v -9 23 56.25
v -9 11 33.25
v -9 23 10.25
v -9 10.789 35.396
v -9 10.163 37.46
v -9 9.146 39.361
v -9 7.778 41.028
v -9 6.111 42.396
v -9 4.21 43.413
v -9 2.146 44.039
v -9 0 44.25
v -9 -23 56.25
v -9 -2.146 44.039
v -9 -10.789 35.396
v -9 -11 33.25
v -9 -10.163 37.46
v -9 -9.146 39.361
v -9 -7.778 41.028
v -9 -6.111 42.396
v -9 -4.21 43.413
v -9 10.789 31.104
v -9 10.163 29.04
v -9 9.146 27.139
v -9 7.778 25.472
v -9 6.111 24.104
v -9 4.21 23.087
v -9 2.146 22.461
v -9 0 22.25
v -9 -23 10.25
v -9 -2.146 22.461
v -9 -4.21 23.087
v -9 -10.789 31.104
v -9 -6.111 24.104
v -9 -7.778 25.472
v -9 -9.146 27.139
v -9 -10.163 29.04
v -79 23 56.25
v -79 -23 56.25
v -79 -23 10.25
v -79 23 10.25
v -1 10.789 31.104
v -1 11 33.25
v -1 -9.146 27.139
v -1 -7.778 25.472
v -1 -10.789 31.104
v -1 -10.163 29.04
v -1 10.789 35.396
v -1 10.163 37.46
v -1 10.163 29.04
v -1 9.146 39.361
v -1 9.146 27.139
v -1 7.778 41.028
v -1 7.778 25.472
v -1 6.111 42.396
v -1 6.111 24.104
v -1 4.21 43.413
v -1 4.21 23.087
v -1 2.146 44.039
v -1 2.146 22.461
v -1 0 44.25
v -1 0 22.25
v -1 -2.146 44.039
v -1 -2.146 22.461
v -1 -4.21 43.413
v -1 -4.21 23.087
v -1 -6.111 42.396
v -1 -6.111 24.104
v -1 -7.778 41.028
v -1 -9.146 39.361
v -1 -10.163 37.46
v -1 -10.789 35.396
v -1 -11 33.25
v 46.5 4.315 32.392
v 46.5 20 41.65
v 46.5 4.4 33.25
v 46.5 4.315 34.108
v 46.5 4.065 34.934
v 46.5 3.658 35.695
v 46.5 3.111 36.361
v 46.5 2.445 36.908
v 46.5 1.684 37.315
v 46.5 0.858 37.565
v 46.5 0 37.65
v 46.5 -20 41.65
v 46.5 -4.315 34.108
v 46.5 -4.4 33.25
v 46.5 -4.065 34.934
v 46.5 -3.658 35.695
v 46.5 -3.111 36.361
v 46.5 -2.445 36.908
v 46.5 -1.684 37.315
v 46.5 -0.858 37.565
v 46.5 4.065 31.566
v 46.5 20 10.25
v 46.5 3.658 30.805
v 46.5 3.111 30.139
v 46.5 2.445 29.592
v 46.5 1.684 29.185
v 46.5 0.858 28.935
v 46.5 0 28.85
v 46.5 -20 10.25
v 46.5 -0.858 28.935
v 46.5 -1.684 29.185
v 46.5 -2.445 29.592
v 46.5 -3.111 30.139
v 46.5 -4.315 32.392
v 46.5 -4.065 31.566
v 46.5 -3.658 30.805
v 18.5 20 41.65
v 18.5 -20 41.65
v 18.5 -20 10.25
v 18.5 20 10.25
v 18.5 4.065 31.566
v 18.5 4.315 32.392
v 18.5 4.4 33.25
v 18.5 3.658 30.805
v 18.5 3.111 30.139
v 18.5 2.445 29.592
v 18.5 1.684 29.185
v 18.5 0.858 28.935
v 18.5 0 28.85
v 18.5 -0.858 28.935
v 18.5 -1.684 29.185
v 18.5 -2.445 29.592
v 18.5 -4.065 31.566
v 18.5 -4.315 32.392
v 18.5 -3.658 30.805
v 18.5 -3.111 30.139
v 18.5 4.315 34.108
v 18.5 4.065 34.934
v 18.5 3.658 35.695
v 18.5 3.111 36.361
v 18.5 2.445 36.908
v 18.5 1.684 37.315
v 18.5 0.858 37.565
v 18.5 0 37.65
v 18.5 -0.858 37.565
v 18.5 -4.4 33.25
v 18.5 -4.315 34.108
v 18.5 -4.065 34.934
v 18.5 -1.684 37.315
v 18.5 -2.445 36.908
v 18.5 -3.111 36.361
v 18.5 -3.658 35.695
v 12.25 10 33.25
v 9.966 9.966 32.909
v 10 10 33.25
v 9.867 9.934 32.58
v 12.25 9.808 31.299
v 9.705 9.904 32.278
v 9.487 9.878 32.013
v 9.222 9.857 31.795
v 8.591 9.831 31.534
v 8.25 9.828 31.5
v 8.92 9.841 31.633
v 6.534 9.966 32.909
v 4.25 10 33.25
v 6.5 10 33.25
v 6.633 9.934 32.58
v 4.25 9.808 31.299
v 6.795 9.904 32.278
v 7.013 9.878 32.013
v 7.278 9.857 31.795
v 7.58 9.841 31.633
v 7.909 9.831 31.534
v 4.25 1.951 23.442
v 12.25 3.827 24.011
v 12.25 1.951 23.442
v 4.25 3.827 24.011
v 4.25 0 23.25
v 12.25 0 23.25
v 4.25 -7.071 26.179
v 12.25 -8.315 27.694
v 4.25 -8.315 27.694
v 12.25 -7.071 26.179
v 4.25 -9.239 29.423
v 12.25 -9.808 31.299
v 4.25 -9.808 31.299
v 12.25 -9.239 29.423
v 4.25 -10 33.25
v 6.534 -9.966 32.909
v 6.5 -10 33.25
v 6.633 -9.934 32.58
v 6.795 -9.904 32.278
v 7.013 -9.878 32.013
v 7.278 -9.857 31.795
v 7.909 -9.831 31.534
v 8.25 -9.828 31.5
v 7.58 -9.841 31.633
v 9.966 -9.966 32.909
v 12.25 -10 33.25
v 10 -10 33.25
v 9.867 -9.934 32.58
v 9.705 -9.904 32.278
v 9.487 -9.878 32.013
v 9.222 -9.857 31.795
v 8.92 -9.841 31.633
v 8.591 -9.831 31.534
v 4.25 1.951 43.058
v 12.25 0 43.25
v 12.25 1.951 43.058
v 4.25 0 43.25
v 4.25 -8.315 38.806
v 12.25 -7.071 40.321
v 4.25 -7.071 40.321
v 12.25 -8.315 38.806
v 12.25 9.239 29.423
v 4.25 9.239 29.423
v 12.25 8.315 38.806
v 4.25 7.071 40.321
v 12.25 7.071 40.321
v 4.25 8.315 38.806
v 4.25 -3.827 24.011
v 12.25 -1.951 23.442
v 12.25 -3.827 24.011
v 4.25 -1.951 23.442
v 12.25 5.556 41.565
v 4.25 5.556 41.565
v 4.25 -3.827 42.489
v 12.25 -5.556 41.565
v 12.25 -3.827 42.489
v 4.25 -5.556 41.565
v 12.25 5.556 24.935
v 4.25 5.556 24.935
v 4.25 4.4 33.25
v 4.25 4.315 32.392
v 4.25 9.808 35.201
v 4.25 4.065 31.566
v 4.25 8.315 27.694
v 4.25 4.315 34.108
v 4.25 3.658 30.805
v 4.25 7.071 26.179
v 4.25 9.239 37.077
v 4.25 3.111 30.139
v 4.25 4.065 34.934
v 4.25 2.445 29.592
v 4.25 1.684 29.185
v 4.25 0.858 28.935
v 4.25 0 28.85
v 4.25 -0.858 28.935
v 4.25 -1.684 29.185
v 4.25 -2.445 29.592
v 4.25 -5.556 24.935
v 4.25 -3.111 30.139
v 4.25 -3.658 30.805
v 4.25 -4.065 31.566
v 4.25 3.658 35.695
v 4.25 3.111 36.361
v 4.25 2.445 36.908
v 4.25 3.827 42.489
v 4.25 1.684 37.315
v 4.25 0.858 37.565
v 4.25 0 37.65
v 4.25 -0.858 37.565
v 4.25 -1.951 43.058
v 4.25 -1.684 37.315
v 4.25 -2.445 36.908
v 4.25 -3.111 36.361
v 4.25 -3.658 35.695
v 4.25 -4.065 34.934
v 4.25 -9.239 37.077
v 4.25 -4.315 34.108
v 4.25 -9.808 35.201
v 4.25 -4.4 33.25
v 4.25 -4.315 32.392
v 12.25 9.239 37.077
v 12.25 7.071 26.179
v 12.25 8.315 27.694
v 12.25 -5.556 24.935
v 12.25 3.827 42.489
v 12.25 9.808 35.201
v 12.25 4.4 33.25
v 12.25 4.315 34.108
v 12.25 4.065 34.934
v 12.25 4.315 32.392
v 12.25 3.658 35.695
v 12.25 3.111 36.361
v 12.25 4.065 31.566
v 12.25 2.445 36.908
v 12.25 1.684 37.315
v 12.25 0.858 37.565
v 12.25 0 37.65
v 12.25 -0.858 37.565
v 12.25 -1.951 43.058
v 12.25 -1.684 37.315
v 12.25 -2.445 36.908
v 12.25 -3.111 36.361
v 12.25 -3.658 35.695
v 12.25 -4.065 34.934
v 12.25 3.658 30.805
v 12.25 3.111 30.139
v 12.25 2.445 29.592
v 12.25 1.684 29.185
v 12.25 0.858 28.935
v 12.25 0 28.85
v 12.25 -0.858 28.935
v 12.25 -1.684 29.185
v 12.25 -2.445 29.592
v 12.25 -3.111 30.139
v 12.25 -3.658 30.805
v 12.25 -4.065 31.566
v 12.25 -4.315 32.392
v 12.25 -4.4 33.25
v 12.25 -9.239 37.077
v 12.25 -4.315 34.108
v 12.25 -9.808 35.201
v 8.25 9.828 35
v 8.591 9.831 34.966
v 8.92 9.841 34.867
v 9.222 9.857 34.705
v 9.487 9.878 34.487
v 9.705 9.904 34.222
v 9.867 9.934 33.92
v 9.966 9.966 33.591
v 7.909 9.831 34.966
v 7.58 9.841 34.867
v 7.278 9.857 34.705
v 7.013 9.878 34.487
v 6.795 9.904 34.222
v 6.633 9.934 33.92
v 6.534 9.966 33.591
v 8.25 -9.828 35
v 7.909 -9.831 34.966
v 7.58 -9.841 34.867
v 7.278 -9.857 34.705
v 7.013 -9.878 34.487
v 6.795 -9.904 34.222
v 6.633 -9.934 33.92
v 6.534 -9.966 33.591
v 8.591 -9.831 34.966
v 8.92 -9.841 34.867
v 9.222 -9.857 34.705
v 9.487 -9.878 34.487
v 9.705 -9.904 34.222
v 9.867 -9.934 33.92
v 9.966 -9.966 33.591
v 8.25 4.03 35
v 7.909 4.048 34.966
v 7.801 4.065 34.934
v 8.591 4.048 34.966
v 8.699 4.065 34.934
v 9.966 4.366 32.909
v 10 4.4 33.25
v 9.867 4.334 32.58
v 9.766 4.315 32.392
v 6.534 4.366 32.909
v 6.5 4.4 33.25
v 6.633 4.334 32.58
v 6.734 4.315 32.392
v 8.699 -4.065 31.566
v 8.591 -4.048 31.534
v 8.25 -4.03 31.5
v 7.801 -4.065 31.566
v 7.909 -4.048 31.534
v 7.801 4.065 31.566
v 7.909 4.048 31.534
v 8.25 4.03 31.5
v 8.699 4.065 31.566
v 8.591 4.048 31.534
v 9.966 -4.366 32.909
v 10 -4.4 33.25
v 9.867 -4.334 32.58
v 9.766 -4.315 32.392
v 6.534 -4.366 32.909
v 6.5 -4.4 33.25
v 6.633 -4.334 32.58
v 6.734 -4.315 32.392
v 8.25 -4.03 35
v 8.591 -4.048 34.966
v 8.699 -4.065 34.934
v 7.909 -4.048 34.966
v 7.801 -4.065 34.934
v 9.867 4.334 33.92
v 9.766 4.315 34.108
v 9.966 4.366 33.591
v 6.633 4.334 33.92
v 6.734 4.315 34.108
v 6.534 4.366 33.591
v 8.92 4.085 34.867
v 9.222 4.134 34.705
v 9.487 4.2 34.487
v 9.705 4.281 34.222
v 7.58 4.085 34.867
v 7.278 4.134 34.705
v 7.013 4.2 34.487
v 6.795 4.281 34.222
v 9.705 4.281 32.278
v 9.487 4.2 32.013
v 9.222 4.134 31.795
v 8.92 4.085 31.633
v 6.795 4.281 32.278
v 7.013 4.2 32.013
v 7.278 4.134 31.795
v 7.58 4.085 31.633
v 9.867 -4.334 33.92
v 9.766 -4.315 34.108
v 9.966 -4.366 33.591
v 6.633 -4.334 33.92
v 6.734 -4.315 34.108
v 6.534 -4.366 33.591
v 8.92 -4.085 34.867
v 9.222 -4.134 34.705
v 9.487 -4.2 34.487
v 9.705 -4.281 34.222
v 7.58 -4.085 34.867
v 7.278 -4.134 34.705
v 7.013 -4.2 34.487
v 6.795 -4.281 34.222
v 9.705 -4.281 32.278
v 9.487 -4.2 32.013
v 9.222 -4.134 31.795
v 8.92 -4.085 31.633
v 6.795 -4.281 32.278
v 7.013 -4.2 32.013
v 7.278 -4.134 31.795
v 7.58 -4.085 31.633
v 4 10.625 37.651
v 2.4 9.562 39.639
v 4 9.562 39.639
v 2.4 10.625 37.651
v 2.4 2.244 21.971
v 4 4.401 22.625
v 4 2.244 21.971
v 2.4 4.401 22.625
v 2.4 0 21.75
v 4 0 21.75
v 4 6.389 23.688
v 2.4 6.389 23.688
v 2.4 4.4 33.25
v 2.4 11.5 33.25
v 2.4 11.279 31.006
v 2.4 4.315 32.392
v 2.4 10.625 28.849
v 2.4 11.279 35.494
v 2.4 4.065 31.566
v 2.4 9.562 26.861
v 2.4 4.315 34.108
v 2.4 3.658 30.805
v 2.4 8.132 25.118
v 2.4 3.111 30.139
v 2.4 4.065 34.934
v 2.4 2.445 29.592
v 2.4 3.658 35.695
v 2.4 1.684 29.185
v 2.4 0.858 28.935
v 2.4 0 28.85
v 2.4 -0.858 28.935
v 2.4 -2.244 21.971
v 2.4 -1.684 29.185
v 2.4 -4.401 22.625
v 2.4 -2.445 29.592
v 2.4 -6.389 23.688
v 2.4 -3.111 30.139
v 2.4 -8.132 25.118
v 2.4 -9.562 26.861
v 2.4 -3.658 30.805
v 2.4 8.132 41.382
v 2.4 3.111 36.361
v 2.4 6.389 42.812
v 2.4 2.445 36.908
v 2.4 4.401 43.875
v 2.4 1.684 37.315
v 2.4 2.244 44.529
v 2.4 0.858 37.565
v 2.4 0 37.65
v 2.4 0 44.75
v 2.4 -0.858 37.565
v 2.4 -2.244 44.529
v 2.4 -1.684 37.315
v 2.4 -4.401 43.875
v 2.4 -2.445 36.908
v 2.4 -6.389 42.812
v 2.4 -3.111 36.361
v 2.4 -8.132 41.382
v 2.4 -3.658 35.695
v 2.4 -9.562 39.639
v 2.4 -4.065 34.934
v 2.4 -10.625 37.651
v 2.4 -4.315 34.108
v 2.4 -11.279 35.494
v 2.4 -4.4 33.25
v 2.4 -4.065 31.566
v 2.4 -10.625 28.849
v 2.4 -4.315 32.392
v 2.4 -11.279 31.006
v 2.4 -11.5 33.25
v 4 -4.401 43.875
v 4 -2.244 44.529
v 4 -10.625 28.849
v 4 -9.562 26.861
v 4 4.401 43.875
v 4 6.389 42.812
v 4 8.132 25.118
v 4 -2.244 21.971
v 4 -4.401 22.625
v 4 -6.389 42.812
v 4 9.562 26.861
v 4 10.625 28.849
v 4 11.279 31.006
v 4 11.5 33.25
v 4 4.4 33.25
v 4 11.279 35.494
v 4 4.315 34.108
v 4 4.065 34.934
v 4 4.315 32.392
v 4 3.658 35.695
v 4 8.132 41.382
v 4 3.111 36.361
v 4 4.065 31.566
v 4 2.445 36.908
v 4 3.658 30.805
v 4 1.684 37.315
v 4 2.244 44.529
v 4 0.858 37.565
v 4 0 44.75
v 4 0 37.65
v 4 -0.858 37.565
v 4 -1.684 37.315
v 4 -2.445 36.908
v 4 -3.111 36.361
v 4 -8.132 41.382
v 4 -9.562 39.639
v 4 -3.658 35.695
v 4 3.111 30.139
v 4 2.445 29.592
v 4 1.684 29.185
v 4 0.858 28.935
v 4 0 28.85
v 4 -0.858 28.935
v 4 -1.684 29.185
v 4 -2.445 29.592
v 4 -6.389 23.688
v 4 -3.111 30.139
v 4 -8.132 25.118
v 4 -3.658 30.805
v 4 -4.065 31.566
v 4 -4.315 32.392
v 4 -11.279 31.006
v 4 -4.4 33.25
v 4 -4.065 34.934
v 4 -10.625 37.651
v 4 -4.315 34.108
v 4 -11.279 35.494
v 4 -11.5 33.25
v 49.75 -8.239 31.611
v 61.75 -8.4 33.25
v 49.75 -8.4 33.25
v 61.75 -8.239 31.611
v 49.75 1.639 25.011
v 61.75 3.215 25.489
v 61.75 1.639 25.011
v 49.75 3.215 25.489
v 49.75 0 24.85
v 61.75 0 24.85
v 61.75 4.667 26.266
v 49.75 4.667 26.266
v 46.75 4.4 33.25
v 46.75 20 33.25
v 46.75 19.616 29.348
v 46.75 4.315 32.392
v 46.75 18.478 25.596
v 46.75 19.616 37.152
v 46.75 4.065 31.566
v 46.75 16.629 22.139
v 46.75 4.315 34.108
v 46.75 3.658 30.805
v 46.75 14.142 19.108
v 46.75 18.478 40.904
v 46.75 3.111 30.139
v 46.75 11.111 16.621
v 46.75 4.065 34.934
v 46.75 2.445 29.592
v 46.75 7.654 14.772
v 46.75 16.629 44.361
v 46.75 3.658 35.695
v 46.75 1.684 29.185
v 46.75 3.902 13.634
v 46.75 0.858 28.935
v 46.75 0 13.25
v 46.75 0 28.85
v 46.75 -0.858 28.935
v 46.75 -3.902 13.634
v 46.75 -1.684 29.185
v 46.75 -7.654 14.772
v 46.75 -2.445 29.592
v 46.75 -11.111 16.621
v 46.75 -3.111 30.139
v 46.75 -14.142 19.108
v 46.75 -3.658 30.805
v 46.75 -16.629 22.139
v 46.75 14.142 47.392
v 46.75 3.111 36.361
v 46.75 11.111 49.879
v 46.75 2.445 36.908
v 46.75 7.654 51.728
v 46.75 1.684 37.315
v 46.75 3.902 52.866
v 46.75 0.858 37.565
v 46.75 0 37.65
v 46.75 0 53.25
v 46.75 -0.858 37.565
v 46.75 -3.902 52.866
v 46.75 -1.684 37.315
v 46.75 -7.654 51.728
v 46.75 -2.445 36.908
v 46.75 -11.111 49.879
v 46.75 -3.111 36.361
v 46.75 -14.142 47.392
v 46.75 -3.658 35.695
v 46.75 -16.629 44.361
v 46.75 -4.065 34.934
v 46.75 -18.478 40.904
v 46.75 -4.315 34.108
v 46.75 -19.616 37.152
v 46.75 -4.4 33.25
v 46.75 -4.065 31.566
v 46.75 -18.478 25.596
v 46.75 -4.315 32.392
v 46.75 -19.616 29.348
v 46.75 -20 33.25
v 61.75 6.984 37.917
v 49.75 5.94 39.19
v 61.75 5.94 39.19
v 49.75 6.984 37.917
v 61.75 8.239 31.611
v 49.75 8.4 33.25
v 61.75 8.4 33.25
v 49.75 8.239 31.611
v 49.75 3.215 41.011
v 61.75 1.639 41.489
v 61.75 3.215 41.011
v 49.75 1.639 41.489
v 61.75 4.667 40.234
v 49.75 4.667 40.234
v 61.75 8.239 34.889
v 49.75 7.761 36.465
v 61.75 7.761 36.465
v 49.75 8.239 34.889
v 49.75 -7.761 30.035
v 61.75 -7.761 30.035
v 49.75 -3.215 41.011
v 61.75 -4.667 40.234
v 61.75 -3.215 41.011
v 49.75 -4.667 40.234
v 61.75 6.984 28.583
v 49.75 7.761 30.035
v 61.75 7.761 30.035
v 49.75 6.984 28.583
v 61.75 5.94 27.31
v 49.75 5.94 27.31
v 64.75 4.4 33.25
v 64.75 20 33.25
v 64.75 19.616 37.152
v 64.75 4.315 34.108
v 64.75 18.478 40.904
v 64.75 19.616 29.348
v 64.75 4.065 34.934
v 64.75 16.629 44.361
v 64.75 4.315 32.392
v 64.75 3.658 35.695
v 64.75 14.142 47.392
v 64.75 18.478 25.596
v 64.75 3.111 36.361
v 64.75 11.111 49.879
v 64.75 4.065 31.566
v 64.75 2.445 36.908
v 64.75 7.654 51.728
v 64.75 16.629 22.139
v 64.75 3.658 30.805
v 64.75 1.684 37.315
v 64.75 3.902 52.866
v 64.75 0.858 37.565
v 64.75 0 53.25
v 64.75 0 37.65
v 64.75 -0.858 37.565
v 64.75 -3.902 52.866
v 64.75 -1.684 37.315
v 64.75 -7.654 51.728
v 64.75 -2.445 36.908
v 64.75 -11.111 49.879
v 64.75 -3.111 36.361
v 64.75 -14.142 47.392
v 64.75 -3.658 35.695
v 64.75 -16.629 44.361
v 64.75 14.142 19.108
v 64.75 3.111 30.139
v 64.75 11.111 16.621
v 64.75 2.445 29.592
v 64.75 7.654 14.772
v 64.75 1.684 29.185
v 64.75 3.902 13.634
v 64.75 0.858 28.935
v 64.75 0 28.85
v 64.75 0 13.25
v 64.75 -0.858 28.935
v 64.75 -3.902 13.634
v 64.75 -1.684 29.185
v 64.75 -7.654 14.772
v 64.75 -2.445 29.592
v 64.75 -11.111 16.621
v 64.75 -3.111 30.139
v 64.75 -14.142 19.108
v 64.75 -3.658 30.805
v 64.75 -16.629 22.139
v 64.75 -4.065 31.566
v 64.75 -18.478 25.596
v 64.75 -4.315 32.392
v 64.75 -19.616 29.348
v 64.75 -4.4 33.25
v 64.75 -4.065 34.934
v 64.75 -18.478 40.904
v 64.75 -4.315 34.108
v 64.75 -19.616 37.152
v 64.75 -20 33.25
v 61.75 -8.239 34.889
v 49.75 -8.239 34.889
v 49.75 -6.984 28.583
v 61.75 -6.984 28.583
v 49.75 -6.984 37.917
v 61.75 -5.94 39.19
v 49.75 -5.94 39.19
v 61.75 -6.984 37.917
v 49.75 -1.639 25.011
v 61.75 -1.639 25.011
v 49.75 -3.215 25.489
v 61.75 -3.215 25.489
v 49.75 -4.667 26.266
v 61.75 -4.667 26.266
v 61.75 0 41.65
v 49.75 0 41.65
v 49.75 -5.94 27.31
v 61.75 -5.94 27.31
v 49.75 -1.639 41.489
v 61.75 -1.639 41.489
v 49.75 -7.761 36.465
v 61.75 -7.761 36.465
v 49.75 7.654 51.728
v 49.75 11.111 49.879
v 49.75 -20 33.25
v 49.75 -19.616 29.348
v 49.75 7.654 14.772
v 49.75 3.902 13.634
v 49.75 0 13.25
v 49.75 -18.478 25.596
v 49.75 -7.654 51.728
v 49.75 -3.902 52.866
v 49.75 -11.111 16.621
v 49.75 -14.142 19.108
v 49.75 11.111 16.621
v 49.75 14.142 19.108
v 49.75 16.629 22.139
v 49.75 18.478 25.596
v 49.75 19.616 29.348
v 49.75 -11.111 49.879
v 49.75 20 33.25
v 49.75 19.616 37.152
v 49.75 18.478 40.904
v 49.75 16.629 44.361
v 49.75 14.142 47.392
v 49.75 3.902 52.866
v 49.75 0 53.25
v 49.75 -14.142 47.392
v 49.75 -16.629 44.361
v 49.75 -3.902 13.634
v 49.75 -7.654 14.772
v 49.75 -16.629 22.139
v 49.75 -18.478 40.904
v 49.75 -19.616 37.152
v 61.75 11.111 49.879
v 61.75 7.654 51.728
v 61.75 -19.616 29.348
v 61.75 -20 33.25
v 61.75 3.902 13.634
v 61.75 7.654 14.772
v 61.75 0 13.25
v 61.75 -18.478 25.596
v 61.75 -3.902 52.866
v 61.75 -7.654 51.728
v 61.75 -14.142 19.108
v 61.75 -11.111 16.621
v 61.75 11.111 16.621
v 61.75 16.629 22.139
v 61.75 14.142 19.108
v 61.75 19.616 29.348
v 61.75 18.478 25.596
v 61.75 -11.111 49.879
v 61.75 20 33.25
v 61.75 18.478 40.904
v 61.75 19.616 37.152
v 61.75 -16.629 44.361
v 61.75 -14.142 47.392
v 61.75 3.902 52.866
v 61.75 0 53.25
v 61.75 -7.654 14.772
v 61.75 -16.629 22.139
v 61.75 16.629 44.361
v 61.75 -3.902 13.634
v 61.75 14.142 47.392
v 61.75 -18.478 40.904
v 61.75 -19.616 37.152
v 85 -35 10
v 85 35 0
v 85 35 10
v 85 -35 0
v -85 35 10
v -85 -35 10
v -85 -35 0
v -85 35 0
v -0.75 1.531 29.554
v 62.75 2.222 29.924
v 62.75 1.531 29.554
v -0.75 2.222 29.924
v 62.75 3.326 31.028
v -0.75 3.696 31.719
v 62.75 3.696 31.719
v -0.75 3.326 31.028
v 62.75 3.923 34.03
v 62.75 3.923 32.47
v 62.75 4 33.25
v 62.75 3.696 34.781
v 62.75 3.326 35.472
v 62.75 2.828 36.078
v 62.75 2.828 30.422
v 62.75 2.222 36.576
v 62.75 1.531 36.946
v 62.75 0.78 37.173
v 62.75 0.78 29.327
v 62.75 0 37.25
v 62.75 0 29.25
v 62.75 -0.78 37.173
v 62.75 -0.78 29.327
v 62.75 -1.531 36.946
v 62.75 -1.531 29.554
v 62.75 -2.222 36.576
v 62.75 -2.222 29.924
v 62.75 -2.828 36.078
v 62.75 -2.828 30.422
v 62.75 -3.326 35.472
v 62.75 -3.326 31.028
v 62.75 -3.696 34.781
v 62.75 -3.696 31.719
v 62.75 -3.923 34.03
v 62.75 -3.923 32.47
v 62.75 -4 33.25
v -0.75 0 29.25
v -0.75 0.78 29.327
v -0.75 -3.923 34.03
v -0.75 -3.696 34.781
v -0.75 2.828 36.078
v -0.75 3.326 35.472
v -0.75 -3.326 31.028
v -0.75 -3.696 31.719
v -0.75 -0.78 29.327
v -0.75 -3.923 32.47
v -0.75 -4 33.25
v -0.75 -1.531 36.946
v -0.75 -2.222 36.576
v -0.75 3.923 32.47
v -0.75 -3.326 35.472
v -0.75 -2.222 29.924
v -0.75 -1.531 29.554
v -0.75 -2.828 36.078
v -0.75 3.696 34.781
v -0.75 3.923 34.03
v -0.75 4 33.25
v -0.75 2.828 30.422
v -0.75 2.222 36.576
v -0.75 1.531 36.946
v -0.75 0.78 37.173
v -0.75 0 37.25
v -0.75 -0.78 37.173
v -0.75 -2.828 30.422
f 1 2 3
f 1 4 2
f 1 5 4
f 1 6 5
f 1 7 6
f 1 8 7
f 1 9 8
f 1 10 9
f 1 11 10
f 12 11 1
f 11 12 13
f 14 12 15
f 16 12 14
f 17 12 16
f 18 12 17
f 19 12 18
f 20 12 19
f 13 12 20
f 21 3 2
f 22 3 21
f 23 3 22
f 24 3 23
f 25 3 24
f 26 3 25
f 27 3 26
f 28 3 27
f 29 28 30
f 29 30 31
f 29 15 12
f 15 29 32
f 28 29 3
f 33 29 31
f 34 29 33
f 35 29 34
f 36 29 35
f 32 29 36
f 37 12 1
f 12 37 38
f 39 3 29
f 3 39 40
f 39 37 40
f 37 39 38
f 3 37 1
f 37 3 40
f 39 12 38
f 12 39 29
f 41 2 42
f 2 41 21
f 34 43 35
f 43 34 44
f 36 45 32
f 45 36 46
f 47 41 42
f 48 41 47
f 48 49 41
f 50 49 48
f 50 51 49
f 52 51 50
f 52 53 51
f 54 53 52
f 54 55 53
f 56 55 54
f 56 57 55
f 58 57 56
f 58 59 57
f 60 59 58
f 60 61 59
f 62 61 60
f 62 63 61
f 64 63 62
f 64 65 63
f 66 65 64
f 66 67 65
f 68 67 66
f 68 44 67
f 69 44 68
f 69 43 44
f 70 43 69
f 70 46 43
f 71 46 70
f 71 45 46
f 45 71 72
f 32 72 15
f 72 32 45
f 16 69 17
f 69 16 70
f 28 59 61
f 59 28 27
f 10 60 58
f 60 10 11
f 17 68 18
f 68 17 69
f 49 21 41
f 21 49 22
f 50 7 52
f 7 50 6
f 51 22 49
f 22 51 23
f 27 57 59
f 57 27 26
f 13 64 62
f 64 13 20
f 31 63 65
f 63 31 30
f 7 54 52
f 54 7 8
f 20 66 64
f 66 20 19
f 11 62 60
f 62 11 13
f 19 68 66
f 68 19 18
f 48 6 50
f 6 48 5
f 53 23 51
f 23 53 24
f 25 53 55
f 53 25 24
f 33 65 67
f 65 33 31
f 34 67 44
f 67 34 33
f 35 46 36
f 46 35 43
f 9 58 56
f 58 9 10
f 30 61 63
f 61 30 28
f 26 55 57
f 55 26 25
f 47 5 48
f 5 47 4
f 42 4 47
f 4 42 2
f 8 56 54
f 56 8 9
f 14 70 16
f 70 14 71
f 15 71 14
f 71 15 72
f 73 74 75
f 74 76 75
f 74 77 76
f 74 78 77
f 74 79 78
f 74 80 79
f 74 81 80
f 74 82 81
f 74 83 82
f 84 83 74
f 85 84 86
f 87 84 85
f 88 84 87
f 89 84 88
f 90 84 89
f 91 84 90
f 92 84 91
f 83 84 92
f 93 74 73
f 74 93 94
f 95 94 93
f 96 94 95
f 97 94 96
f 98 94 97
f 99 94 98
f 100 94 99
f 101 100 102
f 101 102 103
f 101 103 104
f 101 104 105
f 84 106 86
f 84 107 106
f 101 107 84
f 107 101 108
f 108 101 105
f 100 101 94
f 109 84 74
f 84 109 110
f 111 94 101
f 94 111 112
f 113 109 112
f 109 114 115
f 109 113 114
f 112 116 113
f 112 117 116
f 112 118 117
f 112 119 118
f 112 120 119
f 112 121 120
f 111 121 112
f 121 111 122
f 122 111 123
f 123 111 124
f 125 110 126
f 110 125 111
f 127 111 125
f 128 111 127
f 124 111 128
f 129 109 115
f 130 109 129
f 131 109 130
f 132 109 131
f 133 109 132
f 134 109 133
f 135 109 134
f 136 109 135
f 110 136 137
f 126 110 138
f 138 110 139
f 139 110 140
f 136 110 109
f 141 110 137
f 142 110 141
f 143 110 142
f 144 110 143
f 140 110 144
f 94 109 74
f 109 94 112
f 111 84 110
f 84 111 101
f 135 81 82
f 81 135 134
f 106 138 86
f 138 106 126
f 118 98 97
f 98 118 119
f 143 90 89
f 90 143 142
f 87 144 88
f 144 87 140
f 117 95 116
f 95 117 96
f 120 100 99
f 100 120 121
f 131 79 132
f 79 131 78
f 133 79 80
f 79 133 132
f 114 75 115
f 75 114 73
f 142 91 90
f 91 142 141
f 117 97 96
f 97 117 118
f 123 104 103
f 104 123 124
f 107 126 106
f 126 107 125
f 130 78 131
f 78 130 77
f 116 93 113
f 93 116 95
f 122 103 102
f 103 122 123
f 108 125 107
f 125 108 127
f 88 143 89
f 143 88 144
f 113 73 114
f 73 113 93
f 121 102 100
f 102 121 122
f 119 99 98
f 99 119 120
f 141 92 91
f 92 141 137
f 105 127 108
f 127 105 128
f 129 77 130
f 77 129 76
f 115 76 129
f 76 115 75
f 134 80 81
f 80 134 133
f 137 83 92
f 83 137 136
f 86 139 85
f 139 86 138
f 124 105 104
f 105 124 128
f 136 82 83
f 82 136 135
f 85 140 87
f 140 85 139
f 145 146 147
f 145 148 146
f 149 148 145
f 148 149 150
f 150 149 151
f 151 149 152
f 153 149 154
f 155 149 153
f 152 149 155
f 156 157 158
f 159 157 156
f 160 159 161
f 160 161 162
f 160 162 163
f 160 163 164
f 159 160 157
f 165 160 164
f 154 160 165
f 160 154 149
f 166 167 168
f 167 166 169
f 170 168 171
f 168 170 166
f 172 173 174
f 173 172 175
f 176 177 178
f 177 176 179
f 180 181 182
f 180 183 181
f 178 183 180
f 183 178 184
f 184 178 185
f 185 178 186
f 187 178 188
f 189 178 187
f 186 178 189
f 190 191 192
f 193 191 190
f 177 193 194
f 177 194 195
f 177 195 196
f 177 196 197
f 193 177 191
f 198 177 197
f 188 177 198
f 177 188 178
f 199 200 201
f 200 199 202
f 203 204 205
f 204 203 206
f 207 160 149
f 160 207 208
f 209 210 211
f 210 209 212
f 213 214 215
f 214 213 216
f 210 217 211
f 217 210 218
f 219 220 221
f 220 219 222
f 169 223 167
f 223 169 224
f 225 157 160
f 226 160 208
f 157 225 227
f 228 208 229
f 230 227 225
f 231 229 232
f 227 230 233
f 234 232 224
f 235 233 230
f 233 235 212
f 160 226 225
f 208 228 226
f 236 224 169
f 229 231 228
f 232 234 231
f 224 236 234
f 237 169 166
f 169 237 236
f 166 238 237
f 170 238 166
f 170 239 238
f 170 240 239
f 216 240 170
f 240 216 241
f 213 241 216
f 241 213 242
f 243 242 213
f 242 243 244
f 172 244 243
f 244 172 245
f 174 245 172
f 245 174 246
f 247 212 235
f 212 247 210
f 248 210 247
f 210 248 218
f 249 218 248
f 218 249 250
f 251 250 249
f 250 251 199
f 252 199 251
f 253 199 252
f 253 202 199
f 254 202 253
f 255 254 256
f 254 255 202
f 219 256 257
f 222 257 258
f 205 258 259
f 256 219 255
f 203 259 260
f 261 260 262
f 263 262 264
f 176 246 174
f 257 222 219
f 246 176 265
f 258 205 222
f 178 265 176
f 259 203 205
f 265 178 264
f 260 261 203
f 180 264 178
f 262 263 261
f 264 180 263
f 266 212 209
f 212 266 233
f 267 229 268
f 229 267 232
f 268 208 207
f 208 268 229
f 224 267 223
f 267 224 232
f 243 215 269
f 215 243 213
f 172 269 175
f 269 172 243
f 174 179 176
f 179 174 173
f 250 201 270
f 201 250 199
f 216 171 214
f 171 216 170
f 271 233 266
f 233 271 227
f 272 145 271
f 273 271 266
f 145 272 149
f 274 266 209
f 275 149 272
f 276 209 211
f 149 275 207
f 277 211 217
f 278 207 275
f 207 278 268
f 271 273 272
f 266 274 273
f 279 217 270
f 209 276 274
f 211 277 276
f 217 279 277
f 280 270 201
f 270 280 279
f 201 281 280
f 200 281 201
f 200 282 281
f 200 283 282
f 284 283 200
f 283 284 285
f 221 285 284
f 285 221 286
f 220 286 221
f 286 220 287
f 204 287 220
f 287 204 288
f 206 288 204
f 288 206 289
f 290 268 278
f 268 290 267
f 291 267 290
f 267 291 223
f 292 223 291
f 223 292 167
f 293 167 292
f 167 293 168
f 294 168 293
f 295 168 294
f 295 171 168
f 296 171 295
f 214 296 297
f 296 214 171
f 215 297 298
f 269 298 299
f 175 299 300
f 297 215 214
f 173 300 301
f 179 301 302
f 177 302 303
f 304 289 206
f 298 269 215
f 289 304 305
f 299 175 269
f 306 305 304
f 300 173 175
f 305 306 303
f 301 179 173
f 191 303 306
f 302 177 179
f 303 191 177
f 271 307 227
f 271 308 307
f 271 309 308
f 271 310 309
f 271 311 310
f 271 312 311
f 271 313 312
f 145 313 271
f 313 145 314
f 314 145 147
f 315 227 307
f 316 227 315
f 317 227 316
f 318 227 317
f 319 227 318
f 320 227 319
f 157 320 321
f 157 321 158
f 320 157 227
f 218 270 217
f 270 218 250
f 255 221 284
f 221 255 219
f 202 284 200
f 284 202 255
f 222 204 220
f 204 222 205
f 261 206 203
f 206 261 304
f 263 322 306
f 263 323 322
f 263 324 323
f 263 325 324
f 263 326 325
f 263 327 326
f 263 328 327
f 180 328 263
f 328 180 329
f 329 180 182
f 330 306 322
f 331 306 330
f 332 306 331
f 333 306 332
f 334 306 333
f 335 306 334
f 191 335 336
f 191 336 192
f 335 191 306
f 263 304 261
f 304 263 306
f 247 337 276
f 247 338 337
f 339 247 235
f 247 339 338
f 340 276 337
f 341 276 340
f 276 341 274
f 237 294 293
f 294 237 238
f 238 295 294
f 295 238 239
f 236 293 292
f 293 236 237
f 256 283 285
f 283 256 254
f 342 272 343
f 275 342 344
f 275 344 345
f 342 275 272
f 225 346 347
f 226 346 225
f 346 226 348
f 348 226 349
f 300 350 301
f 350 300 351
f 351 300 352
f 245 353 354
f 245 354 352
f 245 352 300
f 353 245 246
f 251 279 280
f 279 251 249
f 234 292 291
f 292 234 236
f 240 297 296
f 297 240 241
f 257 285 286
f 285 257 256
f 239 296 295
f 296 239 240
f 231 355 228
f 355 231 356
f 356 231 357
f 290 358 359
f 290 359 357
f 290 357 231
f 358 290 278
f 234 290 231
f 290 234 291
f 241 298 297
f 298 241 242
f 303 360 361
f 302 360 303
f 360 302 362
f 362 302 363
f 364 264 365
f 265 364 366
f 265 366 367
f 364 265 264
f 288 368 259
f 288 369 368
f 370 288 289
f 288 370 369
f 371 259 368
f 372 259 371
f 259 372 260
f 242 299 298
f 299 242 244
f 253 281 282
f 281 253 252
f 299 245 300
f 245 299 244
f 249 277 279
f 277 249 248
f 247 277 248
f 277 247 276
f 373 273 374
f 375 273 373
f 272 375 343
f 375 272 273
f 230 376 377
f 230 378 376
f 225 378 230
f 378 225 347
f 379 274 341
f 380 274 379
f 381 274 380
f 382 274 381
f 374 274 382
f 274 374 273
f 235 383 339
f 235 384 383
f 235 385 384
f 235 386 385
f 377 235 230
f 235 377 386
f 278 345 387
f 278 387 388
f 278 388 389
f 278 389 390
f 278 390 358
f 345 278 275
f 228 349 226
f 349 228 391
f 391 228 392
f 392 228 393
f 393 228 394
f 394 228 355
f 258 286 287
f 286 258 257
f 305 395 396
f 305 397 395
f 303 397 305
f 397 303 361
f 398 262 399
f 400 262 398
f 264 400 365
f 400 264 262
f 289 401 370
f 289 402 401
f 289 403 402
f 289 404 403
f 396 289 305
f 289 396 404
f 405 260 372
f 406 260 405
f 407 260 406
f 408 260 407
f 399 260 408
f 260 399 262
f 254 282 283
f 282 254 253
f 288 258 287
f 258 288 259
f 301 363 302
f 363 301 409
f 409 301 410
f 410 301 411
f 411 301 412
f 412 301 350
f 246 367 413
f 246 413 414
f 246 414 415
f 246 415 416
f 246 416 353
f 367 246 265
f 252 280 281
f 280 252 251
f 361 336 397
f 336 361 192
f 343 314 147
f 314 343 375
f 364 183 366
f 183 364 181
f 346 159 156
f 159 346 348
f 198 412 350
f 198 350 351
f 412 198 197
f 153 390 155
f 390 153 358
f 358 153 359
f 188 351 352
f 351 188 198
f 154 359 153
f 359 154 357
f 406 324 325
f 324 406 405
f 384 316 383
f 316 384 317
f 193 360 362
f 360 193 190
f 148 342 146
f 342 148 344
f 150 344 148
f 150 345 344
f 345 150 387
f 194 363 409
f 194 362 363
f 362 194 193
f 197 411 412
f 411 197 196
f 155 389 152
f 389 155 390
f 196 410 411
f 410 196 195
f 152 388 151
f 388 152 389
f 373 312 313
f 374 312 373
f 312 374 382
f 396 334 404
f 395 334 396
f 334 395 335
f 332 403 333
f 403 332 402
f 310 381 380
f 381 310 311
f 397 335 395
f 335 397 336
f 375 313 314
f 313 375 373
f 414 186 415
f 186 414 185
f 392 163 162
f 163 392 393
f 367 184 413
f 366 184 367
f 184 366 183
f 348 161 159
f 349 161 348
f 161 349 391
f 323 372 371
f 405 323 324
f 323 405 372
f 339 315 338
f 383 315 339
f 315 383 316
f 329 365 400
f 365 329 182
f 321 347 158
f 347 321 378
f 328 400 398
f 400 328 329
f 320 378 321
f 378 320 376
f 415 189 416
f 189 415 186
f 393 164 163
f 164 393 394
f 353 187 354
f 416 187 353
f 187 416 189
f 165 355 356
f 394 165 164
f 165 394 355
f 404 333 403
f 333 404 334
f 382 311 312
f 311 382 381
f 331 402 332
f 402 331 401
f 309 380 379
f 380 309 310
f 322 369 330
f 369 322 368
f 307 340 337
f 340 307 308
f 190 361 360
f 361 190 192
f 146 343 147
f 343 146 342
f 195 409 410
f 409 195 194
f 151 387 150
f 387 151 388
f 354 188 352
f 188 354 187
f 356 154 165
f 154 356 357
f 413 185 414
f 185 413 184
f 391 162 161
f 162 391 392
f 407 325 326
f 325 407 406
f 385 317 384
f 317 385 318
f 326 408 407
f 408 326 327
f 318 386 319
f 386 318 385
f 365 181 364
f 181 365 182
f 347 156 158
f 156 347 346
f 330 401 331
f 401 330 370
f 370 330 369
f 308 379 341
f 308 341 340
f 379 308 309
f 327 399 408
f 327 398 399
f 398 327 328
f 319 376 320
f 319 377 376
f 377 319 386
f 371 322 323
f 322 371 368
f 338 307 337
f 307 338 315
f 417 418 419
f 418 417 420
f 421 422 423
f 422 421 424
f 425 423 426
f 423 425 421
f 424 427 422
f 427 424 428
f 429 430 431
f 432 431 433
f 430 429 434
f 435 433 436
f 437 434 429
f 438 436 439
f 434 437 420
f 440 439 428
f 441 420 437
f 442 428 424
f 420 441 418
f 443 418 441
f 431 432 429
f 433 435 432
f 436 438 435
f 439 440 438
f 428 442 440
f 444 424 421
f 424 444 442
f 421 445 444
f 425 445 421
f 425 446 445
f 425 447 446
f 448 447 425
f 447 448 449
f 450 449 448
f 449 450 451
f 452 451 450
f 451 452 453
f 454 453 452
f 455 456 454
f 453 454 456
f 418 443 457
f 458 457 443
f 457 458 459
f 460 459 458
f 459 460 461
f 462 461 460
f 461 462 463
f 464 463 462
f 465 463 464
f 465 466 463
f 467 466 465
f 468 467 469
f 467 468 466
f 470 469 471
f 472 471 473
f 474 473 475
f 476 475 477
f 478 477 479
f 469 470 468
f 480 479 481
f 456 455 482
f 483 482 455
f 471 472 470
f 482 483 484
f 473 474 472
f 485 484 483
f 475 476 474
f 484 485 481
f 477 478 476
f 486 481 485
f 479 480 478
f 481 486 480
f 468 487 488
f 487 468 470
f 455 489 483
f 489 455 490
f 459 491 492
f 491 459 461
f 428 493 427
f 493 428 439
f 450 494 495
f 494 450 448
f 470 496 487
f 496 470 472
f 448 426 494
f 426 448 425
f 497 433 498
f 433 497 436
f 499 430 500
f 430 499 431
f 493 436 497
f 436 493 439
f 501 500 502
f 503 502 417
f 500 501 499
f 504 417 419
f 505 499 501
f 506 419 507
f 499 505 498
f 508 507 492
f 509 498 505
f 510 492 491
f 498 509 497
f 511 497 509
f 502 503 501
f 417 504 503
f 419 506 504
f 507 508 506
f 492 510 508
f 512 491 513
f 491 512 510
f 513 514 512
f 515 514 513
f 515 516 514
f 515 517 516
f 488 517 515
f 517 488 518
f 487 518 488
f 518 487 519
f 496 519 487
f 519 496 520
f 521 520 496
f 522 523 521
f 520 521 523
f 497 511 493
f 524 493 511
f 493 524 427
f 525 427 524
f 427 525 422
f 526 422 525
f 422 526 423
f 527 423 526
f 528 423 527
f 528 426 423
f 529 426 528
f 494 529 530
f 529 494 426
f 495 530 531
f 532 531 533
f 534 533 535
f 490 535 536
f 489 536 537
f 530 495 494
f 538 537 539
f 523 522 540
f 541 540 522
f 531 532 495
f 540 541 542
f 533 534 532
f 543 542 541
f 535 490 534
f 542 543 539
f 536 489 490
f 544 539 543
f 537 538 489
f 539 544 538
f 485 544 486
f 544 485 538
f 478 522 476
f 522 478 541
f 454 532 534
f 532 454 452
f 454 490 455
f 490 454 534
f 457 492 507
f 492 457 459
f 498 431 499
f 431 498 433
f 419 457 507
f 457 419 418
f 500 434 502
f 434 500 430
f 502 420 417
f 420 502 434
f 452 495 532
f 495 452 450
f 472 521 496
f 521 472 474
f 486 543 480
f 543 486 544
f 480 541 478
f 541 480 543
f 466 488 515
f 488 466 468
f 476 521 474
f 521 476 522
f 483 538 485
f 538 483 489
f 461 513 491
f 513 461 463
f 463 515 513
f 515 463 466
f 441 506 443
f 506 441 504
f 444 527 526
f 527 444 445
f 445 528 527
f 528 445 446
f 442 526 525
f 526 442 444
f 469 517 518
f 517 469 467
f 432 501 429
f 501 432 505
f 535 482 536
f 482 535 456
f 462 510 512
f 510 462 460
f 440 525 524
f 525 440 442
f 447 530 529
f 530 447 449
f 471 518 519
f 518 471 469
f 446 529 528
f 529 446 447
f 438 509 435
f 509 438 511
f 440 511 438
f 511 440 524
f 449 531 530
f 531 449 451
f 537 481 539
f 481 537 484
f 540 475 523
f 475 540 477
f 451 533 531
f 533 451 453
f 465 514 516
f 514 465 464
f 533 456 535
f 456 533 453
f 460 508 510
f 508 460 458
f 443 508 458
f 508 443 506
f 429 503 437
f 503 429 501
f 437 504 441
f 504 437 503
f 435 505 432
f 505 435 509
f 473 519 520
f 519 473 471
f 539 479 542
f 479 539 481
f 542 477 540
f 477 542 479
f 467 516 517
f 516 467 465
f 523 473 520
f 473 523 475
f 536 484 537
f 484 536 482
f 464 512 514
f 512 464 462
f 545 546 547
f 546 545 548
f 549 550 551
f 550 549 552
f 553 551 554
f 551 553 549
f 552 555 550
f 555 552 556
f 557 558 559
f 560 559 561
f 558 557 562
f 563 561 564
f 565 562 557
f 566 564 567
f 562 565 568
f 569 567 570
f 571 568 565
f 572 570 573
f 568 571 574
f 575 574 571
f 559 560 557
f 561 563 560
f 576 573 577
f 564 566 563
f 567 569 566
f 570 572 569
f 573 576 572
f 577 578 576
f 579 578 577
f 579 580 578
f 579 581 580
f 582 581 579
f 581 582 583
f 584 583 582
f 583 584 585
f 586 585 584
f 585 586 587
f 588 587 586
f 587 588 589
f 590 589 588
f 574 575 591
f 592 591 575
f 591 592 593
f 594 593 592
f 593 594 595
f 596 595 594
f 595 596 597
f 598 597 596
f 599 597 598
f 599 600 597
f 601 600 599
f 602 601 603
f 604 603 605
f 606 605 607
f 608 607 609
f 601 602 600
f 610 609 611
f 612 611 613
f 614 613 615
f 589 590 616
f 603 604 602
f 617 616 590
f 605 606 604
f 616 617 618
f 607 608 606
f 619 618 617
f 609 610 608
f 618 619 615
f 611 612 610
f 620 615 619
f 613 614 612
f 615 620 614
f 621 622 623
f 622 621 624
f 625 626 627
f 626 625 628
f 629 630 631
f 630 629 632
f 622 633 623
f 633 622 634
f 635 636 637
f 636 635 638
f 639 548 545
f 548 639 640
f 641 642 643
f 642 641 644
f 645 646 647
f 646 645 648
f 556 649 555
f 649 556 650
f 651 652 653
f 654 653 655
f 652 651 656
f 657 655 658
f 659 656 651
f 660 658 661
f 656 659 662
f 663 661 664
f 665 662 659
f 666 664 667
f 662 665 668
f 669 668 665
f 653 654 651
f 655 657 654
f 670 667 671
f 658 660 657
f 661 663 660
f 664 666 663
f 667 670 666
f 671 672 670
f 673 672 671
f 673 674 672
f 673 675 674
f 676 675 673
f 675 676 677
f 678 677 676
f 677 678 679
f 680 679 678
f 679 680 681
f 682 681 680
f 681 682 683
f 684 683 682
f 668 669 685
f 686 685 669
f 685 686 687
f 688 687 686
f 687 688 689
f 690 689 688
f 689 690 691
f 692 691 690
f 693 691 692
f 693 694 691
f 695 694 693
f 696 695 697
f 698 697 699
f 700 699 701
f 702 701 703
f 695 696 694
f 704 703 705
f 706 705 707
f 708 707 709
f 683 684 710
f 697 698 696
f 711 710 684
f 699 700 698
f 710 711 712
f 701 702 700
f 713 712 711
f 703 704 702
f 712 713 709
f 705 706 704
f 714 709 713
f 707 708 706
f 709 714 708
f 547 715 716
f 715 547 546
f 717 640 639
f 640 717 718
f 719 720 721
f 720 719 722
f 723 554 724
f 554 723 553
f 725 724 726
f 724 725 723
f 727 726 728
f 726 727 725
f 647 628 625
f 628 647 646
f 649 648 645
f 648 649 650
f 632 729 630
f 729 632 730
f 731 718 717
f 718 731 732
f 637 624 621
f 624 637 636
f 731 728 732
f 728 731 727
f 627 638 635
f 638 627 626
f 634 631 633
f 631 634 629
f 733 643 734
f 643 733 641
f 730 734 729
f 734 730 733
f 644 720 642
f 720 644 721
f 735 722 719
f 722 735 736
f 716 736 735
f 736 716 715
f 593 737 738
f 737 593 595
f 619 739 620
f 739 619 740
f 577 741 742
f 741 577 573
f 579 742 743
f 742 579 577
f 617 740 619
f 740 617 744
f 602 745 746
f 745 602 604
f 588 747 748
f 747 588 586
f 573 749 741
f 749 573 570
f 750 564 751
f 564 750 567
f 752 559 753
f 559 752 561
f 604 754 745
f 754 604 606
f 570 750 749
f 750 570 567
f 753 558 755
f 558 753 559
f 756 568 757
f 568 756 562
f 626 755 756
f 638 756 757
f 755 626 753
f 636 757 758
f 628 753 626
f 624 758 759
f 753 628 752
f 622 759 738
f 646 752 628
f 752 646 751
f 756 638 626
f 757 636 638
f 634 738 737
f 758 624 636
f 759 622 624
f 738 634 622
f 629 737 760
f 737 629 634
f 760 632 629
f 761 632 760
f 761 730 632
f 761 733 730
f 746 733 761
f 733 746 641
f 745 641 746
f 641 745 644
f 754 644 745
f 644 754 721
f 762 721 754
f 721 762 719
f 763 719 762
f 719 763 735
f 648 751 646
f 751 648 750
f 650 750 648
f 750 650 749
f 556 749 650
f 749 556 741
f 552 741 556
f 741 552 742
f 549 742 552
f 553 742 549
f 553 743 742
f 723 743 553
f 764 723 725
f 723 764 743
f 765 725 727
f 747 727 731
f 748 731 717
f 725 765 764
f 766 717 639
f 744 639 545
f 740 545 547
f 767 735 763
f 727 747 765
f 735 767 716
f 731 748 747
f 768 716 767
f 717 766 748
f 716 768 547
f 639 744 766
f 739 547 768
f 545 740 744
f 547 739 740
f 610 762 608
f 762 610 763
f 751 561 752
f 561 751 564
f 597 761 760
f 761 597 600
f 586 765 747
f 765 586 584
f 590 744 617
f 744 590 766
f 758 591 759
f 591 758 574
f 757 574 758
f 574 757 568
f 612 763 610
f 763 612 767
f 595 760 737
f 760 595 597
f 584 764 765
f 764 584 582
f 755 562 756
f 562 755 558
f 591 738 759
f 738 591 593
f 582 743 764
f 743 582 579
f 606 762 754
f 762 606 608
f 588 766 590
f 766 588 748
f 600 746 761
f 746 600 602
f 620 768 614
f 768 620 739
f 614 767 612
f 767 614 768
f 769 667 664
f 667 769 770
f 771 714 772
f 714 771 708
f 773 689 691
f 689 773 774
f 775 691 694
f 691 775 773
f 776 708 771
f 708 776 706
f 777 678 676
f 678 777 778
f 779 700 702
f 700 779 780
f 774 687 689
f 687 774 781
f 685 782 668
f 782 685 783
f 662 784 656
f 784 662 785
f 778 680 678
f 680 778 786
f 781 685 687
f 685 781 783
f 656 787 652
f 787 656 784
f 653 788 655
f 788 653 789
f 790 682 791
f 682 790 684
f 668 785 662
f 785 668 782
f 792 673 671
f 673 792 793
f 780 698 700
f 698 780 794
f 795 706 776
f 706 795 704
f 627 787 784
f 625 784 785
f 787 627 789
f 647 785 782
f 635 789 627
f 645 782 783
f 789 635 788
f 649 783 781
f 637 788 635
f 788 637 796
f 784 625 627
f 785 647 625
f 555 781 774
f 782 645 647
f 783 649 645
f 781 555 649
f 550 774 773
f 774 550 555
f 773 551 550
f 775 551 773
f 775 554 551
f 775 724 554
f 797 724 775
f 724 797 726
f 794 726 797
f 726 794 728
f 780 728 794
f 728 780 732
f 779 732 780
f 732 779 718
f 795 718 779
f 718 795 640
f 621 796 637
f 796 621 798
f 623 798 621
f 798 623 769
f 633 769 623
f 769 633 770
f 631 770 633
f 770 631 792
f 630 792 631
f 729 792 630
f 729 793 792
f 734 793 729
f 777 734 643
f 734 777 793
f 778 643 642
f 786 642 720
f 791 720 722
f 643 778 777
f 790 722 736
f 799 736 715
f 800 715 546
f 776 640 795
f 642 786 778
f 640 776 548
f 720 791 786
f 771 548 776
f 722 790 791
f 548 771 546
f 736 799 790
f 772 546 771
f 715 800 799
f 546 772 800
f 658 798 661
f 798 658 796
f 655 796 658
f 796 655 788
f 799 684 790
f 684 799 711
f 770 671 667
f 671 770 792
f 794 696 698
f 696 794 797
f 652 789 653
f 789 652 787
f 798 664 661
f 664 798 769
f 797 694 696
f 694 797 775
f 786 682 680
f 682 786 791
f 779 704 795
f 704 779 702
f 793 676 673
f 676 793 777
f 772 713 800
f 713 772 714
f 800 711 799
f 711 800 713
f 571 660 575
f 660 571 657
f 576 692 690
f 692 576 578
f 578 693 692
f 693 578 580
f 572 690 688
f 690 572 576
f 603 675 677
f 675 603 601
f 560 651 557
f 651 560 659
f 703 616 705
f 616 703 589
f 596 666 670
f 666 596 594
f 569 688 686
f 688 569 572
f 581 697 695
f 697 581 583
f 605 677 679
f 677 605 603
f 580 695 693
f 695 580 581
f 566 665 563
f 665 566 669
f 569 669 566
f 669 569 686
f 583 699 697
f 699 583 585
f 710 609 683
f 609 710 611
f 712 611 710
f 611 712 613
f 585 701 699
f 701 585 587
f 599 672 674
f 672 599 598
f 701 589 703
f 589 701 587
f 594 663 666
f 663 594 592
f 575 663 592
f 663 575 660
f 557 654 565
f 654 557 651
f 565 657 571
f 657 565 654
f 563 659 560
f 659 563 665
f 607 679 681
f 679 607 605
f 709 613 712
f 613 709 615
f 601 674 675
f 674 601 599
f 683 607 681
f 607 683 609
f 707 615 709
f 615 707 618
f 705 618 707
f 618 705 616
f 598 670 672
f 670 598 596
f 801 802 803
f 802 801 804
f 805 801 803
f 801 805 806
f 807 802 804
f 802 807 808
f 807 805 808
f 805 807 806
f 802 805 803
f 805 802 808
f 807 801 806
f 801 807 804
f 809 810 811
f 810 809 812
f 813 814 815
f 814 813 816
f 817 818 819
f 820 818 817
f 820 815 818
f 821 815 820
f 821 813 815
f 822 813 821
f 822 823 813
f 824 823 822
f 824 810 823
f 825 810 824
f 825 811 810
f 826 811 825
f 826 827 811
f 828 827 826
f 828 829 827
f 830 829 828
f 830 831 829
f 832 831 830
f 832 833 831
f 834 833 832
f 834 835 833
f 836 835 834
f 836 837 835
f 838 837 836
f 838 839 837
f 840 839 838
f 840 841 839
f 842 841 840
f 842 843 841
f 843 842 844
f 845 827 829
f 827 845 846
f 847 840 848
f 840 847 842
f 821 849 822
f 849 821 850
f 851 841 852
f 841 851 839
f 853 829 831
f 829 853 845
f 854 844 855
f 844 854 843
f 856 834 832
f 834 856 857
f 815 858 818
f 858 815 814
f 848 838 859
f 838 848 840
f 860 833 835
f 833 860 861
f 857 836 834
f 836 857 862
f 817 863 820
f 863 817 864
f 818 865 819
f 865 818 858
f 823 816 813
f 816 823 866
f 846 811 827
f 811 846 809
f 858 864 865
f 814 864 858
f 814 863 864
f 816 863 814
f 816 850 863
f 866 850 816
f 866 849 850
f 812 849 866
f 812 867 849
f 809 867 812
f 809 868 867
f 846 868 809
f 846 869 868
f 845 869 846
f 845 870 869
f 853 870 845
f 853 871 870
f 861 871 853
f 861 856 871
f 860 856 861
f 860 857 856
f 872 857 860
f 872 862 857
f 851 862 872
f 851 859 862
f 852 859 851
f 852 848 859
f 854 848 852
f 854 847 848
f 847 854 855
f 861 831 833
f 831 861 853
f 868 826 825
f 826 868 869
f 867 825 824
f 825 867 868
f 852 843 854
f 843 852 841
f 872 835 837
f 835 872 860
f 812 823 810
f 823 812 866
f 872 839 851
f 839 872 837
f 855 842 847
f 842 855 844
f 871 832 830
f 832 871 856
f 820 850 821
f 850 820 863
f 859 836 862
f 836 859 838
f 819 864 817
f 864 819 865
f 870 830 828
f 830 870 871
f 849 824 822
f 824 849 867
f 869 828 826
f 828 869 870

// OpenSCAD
$fn = 32;

// ------------------------------------------------------------------------
// Motor drive station: motor 70 x 46 mm, shaft d8, pulley d40
// Every part is its own module, assembly() places every instance.
// ------------------------------------------------------------------------

// --- part 1 ---
module station_bed() {
  difference() {
    translate([-85, -35, 0]) cube([170, 70, 10]);
  }
}

// --- part 2 ---
module drive_motor() {
  union() {
    translate([-35, -23, 0]) cube([70, 46, 46]);
    translate([39, 0, 23]) rotate([0, 90, 0]) cylinder(h = 8, d = 22, center = true);
  }
}

// --- part 3 ---
module pillow_block() {
  difference() {
    translate([-14, -20, 0]) cube([28, 40, 31.4]);
    translate([0, 0, 23]) rotate([0, 90, 0]) cylinder(h = 30, d = 8.8, center = true);
  }
}

// --- part 4 ---
module drive_shaft() {
  translate([0, 0, -31.75]) cylinder(h = 63.5, d = 8);
}

// --- part 5 ---
module shaft_collar() {
  difference() {
    cylinder(h = 8, d = 20);
    translate([0, 0, -1]) cylinder(h = 10, d = 8.8);
    translate([0, 0, 4]) rotate([90, 0, 0]) cylinder(h = 22, d = 3.5, center = true);
  }
}

// --- part 6 ---
module collar_washer() {
  difference() {
      translate([0, 0, 0]) cylinder(h = 1.6, d = 23);
      translate([0, 0, -1]) cylinder(h = 3.6, d = 8.8);
    }
}

// --- part 7 ---
module drive_pulley() {
  difference() {
    union() {
      cylinder(h = 18, d = 16.8);
      cylinder(h = 3, d = 40);
      translate([0, 0, 15]) cylinder(h = 3, d = 40);
    }
    translate([0, 0, -1]) cylinder(h = 20, d = 8.8);
  }
}

// --- assembly ---
module assembly() {
  color([0.80, 0.24, 0.20]) translate([0, 0, 0]) rotate([0, 0, 0]) station_bed();
  color([0.20, 0.45, 0.75]) translate([-44, 0, 10.25]) rotate([0, 0, 0]) drive_motor();
  color([0.25, 0.62, 0.32]) translate([32.5, 0, 10.25]) rotate([0, 0, 0]) pillow_block();
  color([0.92, 0.70, 0.18]) translate([31, 0, 33.25]) rotate([0, 90, 0]) drive_shaft();
  color([0.58, 0.35, 0.70]) translate([4.25, 0, 33.25]) rotate([0, 90, 0]) shaft_collar();
  color([0.16, 0.66, 0.66]) translate([2.4, 0, 33.25]) rotate([0, 90, 0]) collar_washer();
  color([0.85, 0.48, 0.18]) translate([46.75, 0, 33.25]) rotate([0, 90, 0]) drive_pulley();
}

assembly();
